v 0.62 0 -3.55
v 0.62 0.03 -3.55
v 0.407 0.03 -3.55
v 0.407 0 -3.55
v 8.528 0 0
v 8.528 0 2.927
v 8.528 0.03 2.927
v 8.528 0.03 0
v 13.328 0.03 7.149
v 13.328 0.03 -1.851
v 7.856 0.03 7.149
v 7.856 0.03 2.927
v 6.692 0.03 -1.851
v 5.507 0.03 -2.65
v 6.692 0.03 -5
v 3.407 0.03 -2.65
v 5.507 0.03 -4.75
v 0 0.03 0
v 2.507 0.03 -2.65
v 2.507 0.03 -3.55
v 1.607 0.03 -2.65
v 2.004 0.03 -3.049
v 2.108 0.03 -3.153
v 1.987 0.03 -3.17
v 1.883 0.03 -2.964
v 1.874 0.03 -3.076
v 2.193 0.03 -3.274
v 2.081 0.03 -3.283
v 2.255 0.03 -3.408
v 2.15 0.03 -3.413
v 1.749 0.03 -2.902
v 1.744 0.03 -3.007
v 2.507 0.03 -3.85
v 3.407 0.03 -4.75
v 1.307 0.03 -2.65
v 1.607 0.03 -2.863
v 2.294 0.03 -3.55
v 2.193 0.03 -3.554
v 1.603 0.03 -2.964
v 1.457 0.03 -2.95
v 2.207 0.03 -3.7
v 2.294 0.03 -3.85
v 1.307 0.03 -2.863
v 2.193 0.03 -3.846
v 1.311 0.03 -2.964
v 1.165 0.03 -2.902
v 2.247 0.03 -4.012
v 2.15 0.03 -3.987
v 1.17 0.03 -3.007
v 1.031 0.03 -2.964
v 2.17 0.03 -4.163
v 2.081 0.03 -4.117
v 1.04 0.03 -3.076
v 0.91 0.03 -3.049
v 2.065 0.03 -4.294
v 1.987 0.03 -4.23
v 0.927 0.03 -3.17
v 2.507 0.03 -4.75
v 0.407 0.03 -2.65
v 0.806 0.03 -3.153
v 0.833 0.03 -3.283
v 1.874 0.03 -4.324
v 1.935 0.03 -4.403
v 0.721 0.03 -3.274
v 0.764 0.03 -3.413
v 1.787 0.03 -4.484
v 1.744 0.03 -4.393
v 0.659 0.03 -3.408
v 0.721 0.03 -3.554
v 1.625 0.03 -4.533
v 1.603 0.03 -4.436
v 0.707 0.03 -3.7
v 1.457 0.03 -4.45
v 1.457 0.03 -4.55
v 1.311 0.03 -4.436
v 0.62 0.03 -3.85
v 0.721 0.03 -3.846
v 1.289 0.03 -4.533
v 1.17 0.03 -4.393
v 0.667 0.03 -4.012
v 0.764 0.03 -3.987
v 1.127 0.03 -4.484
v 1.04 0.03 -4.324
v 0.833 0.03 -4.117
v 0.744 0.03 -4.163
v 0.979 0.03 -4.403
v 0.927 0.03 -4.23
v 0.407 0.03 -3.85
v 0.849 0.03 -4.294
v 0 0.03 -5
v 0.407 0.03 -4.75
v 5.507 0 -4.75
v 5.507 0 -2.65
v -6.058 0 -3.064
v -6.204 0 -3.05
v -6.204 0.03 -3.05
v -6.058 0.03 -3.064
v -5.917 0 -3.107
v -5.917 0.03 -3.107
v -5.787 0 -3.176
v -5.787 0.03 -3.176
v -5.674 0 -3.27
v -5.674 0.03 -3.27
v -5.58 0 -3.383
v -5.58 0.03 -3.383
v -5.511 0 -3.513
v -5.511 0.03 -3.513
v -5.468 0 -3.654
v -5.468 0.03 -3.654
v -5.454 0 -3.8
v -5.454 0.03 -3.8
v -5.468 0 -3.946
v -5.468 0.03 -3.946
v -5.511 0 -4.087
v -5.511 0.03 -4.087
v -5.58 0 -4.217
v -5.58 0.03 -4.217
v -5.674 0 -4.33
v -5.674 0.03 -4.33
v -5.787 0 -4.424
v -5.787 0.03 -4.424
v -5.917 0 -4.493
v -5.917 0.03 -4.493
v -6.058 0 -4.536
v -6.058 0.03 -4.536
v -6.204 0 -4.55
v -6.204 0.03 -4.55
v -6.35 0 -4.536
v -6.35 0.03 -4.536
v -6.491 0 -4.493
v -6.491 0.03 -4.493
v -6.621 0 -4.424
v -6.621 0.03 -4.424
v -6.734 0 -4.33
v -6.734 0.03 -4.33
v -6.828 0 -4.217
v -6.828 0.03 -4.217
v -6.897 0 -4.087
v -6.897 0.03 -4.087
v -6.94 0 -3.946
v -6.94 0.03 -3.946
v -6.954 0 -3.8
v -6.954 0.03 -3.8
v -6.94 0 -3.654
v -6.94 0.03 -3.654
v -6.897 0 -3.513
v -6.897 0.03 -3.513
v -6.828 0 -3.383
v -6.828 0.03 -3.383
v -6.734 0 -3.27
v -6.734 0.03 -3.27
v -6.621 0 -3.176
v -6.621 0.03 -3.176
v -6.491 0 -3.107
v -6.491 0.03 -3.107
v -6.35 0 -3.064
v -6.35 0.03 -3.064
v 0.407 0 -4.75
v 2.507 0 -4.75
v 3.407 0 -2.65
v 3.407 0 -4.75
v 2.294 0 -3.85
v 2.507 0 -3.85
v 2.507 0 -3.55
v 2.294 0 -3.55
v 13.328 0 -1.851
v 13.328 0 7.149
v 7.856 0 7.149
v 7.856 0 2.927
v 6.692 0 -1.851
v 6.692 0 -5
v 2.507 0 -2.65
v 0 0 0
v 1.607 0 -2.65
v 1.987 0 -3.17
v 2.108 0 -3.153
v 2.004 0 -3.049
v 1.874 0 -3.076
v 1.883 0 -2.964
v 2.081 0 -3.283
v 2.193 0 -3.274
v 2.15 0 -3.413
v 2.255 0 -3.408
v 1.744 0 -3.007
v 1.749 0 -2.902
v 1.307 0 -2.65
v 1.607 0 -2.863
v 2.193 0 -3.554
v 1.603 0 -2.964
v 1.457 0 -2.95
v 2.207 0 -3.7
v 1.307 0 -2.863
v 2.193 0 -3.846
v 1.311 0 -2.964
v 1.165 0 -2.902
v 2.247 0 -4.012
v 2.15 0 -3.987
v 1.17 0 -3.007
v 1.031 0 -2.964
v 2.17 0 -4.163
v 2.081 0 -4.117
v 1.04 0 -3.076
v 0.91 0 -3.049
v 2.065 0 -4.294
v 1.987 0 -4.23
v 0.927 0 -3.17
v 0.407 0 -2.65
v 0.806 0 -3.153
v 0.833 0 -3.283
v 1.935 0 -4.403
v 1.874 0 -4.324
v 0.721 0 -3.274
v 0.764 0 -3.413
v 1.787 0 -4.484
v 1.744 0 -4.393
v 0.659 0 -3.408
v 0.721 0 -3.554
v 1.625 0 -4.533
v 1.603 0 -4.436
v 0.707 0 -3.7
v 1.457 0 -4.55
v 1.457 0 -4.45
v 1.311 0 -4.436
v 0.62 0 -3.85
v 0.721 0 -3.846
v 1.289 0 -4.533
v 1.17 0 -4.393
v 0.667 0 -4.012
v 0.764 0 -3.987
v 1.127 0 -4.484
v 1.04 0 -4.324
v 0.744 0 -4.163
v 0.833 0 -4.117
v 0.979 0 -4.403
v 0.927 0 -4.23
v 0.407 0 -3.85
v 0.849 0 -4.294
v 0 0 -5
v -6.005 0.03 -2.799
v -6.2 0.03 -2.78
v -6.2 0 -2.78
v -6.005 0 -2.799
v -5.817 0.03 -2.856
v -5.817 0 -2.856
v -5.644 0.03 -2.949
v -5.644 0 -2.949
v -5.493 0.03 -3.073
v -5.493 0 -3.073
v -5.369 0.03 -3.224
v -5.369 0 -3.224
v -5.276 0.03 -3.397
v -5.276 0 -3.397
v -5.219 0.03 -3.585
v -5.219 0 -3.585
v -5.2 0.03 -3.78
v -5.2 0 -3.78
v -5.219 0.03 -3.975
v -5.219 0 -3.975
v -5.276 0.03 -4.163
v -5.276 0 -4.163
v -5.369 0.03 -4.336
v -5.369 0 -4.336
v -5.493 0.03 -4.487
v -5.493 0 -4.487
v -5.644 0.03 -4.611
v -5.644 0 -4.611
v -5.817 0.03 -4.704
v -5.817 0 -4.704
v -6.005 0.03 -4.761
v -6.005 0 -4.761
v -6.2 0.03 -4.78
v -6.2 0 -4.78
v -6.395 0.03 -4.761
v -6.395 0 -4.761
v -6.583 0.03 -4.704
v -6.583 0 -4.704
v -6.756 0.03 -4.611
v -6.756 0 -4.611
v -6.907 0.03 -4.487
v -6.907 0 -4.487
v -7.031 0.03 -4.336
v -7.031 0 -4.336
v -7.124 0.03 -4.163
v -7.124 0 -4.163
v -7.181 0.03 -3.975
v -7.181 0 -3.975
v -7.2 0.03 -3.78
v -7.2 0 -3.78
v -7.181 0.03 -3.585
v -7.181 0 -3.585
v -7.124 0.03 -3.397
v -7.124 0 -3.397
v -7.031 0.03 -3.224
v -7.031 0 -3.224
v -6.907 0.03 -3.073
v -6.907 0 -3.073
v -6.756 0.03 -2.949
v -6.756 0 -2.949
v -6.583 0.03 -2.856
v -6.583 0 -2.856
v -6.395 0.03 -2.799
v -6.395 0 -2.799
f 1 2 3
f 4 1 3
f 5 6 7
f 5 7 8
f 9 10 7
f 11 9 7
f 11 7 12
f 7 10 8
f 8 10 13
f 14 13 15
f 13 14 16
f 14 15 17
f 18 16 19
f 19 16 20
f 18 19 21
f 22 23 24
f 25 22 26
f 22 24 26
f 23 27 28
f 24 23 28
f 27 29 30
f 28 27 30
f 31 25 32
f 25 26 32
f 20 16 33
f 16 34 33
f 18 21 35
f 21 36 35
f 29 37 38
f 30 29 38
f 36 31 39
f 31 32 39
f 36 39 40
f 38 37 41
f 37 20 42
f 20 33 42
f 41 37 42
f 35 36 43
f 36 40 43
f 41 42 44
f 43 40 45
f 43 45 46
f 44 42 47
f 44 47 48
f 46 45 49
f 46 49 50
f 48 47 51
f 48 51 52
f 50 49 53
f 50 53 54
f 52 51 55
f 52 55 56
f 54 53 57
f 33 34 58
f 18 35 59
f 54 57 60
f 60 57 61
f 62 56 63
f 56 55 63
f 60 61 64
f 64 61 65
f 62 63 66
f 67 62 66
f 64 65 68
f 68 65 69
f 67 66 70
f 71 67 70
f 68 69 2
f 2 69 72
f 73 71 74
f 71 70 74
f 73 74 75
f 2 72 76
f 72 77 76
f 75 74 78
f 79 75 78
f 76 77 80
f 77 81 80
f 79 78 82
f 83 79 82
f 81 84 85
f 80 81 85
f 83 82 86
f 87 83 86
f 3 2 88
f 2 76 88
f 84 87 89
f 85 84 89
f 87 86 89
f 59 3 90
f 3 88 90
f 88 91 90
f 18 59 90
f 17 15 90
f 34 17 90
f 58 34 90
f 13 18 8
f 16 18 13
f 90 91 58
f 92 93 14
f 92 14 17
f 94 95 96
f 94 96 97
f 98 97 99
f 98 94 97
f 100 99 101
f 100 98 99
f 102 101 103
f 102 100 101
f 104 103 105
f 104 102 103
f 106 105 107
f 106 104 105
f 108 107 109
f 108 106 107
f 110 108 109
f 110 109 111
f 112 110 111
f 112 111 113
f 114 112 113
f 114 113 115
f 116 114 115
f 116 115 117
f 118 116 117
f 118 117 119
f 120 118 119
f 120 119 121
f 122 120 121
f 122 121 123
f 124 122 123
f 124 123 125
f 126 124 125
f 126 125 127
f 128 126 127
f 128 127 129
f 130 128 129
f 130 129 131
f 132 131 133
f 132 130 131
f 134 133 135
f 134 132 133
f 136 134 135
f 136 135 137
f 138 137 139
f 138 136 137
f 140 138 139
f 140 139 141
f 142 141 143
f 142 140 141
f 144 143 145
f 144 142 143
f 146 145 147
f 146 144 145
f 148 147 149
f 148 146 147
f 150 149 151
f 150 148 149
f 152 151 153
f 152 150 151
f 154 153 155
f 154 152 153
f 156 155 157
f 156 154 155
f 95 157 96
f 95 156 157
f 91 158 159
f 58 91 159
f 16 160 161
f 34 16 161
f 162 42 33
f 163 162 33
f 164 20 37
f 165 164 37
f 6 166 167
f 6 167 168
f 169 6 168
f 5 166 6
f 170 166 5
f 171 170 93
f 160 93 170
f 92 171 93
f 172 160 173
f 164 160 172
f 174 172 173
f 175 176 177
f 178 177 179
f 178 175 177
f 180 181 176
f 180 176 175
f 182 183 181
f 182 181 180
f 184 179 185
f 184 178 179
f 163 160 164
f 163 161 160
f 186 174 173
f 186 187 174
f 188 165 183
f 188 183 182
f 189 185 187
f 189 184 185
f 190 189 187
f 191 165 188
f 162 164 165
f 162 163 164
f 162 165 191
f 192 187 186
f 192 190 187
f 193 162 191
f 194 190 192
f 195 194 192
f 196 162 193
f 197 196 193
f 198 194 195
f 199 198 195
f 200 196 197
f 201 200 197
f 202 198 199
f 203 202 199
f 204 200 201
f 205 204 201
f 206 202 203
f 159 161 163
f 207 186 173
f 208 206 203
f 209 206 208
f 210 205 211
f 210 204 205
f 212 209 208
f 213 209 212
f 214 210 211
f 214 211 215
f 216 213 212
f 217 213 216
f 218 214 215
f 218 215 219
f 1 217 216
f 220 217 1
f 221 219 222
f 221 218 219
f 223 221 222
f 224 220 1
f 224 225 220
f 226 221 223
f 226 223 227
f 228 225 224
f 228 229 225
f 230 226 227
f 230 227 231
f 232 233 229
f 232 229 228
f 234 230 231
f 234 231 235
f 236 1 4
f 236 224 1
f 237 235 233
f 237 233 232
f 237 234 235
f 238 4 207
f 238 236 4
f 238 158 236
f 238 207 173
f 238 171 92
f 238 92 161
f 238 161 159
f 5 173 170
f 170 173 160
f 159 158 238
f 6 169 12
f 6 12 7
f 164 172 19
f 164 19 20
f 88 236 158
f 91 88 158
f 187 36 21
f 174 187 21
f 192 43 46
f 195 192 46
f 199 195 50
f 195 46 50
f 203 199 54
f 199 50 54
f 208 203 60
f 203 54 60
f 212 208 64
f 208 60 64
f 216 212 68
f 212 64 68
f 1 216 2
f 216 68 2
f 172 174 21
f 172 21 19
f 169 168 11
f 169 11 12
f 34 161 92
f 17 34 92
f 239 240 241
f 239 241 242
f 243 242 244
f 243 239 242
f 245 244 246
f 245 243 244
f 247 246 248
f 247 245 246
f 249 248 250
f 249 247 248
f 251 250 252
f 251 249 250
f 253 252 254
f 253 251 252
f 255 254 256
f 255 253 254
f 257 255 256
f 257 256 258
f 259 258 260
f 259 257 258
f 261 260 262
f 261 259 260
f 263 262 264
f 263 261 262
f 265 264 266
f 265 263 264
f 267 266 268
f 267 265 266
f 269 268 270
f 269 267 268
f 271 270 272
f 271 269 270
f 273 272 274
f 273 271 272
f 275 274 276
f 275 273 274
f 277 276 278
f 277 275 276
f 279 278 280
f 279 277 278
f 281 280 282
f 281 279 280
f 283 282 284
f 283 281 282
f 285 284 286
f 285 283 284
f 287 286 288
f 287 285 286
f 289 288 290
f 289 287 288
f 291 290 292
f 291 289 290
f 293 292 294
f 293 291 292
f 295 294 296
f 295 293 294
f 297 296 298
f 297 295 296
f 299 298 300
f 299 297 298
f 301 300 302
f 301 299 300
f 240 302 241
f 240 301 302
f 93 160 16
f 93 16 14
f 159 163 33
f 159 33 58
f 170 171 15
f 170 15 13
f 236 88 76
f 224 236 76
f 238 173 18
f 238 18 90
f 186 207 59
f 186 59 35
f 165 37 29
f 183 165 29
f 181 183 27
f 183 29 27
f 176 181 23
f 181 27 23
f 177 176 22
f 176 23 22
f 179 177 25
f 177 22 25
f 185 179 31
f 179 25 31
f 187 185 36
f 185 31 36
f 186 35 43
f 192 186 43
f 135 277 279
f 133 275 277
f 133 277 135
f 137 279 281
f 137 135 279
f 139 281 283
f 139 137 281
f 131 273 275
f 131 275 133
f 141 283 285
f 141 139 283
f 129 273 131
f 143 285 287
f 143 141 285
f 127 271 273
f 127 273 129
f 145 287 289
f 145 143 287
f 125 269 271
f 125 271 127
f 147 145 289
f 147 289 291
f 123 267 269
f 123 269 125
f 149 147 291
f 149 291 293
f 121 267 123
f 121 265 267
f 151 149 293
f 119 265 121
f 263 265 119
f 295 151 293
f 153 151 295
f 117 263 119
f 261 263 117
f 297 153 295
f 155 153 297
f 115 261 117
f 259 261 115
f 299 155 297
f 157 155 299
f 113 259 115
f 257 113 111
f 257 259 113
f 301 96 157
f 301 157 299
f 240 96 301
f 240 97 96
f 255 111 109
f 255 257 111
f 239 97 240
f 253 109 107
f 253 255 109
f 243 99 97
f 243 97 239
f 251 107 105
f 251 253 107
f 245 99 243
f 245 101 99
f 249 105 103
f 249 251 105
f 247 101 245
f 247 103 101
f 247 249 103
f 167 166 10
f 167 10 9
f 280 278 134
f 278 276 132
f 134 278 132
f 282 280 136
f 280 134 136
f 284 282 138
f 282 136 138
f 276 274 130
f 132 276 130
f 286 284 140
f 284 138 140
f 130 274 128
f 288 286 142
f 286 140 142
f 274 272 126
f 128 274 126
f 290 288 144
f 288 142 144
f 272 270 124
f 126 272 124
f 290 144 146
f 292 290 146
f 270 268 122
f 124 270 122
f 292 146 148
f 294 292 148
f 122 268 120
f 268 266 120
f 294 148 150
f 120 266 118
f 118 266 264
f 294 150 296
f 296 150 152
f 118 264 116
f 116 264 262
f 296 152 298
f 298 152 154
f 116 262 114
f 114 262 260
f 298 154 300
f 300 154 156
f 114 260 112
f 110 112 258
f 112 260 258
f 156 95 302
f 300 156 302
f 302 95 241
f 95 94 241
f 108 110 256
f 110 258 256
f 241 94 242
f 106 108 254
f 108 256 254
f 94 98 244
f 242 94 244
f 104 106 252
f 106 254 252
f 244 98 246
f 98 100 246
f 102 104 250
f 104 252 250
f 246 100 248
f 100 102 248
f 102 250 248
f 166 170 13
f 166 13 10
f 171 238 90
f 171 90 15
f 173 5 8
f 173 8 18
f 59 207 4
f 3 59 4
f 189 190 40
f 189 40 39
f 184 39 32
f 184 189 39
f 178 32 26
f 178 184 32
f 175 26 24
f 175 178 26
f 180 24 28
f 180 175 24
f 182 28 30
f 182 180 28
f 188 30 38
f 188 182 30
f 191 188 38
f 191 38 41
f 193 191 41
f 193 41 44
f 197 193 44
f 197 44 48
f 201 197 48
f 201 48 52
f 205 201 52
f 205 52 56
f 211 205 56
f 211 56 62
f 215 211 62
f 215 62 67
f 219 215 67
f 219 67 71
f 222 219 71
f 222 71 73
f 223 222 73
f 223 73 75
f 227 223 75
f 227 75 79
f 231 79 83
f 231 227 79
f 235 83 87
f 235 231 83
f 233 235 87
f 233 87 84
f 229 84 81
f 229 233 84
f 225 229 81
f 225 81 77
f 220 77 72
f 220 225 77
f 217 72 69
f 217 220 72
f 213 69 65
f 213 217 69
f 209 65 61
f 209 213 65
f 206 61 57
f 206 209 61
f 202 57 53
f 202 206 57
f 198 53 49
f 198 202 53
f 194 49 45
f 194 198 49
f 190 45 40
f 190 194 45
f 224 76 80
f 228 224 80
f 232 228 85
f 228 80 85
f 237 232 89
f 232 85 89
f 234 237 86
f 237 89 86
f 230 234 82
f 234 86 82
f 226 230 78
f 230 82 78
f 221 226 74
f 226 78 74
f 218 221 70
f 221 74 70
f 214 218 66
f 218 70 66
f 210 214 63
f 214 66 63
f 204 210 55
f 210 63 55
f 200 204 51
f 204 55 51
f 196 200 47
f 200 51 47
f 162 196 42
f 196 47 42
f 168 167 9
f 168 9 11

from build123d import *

# Parameters (mm, degrees)
SKETCH1_W               = 2.1
SKETCH1_H               = 2.1
BOSS_EXTRUDE1_DEPTH     = 0.03
BOSS_EXTRUDE2_DEPTH     = 0.03
SKETCH3_R               = 1
BOSS_EXTRUDE3_DEPTH     = 0.03
CUT_EXTRUDE1_DEPTH      = 16.124307753
CUT_EXTRUDE1_DEPTH_BACK = 16.124307753
SKETCH4_R               = 0.75


with BuildPart() as part:
    # Sketch1 → Boss-Extrude1 (new body)
    with BuildSketch(Plane(origin=(0, 0, 0), x_dir=(1, 0, 0), z_dir=(0, 1, 0))):
        Polygon((0, 0), (0, 5), (6.692, 5), (6.692, 1.851), (13.328, 1.851), (13.328, -7.149), (7.856, -7.149), (7.856, -2.927), (8.528, -2.927), (8.528, 0), align=None)
        with Locations((1.457, 3.7)):
            Rectangle(SKETCH1_W, SKETCH1_H, mode=Mode.SUBTRACT)
        with Locations((4.457, 3.7)):
            Rectangle(SKETCH1_W, SKETCH1_H, mode=Mode.SUBTRACT)
    extrude(amount=BOSS_EXTRUDE1_DEPTH)

    # Sketch2 → Boss-Extrude2 (add)
    with BuildSketch(Plane(origin=(0, 0.03, 0), x_dir=(1, 0, 0), z_dir=(0, 1, 0))):
        with BuildLine():
            Line((2.507, 3.55), (2.293660027, 3.55))
            ThreePointArc((2.293660027, 3.55), (2.058040764, 3.098959236), (1.607, 2.863339973))
            Line((1.607, 2.863339973), (1.607, 2.65))
            Line((1.607, 2.65), (1.307, 2.65))
            Line((1.307, 2.65), (1.307, 2.863339973))
            ThreePointArc((1.307, 2.863339973), (0.855959236, 3.098959236), (0.620339973, 3.55))
            Line((0.620339973, 3.55), (0.407, 3.55))
            Line((0.407, 3.55), (0.407, 3.85))
            Line((0.407, 3.85), (0.620339973, 3.85))
            ThreePointArc((0.620339973, 3.85), (1.457, 4.55), (2.293660027, 3.85))
            Line((2.293660027, 3.85), (2.507, 3.85))
            Line((2.507, 3.85), (2.507, 3.55))
        make_face()
    extrude(amount=-BOSS_EXTRUDE2_DEPTH)


with BuildPart() as body_2:
    # Sketch3 → Boss-Extrude3 (new body)
    with BuildSketch(Plane(origin=(0, 0.03, 0), x_dir=(1, 0, 0), z_dir=(0, 1, 0))):
        with Locations(Location((-6.2, 3.78, 0), (0, 0, 270))):
            Circle(SKETCH3_R)
    extrude(amount=-BOSS_EXTRUDE3_DEPTH)


with BuildPart() as cut_extrude1_tool:
    # Sketch4 → Cut-Extrude1 (new, two sides: drawn at the far end of the back side and taken through both)
    with BuildSketch(Plane(origin=(0, 0.03, 0), x_dir=(1, 0, 0), z_dir=(0, 1, 0)).offset(-CUT_EXTRUDE1_DEPTH_BACK)):
        with Locations(Location((-6.204, 3.8, 0), (0, 0, 270))):
            Circle(SKETCH4_R)
        with Locations(Location((1.457, 3.7, 0), (0, 0, 270))):
            Circle(SKETCH4_R)
    extrude(amount=CUT_EXTRUDE1_DEPTH + CUT_EXTRUDE1_DEPTH_BACK)


with BuildPart() as part_1:
    add(part.part)

    # Cut-Extrude1: cut by cut_extrude1_tool
    add(cut_extrude1_tool.part, mode=Mode.SUBTRACT)


with BuildPart() as body_2_1:
    add(body_2.part)

    # Cut-Extrude1: cut by cut_extrude1_tool
    add(cut_extrude1_tool.part, mode=Mode.SUBTRACT)


solid = Compound([part_1.part, body_2_1.part])
